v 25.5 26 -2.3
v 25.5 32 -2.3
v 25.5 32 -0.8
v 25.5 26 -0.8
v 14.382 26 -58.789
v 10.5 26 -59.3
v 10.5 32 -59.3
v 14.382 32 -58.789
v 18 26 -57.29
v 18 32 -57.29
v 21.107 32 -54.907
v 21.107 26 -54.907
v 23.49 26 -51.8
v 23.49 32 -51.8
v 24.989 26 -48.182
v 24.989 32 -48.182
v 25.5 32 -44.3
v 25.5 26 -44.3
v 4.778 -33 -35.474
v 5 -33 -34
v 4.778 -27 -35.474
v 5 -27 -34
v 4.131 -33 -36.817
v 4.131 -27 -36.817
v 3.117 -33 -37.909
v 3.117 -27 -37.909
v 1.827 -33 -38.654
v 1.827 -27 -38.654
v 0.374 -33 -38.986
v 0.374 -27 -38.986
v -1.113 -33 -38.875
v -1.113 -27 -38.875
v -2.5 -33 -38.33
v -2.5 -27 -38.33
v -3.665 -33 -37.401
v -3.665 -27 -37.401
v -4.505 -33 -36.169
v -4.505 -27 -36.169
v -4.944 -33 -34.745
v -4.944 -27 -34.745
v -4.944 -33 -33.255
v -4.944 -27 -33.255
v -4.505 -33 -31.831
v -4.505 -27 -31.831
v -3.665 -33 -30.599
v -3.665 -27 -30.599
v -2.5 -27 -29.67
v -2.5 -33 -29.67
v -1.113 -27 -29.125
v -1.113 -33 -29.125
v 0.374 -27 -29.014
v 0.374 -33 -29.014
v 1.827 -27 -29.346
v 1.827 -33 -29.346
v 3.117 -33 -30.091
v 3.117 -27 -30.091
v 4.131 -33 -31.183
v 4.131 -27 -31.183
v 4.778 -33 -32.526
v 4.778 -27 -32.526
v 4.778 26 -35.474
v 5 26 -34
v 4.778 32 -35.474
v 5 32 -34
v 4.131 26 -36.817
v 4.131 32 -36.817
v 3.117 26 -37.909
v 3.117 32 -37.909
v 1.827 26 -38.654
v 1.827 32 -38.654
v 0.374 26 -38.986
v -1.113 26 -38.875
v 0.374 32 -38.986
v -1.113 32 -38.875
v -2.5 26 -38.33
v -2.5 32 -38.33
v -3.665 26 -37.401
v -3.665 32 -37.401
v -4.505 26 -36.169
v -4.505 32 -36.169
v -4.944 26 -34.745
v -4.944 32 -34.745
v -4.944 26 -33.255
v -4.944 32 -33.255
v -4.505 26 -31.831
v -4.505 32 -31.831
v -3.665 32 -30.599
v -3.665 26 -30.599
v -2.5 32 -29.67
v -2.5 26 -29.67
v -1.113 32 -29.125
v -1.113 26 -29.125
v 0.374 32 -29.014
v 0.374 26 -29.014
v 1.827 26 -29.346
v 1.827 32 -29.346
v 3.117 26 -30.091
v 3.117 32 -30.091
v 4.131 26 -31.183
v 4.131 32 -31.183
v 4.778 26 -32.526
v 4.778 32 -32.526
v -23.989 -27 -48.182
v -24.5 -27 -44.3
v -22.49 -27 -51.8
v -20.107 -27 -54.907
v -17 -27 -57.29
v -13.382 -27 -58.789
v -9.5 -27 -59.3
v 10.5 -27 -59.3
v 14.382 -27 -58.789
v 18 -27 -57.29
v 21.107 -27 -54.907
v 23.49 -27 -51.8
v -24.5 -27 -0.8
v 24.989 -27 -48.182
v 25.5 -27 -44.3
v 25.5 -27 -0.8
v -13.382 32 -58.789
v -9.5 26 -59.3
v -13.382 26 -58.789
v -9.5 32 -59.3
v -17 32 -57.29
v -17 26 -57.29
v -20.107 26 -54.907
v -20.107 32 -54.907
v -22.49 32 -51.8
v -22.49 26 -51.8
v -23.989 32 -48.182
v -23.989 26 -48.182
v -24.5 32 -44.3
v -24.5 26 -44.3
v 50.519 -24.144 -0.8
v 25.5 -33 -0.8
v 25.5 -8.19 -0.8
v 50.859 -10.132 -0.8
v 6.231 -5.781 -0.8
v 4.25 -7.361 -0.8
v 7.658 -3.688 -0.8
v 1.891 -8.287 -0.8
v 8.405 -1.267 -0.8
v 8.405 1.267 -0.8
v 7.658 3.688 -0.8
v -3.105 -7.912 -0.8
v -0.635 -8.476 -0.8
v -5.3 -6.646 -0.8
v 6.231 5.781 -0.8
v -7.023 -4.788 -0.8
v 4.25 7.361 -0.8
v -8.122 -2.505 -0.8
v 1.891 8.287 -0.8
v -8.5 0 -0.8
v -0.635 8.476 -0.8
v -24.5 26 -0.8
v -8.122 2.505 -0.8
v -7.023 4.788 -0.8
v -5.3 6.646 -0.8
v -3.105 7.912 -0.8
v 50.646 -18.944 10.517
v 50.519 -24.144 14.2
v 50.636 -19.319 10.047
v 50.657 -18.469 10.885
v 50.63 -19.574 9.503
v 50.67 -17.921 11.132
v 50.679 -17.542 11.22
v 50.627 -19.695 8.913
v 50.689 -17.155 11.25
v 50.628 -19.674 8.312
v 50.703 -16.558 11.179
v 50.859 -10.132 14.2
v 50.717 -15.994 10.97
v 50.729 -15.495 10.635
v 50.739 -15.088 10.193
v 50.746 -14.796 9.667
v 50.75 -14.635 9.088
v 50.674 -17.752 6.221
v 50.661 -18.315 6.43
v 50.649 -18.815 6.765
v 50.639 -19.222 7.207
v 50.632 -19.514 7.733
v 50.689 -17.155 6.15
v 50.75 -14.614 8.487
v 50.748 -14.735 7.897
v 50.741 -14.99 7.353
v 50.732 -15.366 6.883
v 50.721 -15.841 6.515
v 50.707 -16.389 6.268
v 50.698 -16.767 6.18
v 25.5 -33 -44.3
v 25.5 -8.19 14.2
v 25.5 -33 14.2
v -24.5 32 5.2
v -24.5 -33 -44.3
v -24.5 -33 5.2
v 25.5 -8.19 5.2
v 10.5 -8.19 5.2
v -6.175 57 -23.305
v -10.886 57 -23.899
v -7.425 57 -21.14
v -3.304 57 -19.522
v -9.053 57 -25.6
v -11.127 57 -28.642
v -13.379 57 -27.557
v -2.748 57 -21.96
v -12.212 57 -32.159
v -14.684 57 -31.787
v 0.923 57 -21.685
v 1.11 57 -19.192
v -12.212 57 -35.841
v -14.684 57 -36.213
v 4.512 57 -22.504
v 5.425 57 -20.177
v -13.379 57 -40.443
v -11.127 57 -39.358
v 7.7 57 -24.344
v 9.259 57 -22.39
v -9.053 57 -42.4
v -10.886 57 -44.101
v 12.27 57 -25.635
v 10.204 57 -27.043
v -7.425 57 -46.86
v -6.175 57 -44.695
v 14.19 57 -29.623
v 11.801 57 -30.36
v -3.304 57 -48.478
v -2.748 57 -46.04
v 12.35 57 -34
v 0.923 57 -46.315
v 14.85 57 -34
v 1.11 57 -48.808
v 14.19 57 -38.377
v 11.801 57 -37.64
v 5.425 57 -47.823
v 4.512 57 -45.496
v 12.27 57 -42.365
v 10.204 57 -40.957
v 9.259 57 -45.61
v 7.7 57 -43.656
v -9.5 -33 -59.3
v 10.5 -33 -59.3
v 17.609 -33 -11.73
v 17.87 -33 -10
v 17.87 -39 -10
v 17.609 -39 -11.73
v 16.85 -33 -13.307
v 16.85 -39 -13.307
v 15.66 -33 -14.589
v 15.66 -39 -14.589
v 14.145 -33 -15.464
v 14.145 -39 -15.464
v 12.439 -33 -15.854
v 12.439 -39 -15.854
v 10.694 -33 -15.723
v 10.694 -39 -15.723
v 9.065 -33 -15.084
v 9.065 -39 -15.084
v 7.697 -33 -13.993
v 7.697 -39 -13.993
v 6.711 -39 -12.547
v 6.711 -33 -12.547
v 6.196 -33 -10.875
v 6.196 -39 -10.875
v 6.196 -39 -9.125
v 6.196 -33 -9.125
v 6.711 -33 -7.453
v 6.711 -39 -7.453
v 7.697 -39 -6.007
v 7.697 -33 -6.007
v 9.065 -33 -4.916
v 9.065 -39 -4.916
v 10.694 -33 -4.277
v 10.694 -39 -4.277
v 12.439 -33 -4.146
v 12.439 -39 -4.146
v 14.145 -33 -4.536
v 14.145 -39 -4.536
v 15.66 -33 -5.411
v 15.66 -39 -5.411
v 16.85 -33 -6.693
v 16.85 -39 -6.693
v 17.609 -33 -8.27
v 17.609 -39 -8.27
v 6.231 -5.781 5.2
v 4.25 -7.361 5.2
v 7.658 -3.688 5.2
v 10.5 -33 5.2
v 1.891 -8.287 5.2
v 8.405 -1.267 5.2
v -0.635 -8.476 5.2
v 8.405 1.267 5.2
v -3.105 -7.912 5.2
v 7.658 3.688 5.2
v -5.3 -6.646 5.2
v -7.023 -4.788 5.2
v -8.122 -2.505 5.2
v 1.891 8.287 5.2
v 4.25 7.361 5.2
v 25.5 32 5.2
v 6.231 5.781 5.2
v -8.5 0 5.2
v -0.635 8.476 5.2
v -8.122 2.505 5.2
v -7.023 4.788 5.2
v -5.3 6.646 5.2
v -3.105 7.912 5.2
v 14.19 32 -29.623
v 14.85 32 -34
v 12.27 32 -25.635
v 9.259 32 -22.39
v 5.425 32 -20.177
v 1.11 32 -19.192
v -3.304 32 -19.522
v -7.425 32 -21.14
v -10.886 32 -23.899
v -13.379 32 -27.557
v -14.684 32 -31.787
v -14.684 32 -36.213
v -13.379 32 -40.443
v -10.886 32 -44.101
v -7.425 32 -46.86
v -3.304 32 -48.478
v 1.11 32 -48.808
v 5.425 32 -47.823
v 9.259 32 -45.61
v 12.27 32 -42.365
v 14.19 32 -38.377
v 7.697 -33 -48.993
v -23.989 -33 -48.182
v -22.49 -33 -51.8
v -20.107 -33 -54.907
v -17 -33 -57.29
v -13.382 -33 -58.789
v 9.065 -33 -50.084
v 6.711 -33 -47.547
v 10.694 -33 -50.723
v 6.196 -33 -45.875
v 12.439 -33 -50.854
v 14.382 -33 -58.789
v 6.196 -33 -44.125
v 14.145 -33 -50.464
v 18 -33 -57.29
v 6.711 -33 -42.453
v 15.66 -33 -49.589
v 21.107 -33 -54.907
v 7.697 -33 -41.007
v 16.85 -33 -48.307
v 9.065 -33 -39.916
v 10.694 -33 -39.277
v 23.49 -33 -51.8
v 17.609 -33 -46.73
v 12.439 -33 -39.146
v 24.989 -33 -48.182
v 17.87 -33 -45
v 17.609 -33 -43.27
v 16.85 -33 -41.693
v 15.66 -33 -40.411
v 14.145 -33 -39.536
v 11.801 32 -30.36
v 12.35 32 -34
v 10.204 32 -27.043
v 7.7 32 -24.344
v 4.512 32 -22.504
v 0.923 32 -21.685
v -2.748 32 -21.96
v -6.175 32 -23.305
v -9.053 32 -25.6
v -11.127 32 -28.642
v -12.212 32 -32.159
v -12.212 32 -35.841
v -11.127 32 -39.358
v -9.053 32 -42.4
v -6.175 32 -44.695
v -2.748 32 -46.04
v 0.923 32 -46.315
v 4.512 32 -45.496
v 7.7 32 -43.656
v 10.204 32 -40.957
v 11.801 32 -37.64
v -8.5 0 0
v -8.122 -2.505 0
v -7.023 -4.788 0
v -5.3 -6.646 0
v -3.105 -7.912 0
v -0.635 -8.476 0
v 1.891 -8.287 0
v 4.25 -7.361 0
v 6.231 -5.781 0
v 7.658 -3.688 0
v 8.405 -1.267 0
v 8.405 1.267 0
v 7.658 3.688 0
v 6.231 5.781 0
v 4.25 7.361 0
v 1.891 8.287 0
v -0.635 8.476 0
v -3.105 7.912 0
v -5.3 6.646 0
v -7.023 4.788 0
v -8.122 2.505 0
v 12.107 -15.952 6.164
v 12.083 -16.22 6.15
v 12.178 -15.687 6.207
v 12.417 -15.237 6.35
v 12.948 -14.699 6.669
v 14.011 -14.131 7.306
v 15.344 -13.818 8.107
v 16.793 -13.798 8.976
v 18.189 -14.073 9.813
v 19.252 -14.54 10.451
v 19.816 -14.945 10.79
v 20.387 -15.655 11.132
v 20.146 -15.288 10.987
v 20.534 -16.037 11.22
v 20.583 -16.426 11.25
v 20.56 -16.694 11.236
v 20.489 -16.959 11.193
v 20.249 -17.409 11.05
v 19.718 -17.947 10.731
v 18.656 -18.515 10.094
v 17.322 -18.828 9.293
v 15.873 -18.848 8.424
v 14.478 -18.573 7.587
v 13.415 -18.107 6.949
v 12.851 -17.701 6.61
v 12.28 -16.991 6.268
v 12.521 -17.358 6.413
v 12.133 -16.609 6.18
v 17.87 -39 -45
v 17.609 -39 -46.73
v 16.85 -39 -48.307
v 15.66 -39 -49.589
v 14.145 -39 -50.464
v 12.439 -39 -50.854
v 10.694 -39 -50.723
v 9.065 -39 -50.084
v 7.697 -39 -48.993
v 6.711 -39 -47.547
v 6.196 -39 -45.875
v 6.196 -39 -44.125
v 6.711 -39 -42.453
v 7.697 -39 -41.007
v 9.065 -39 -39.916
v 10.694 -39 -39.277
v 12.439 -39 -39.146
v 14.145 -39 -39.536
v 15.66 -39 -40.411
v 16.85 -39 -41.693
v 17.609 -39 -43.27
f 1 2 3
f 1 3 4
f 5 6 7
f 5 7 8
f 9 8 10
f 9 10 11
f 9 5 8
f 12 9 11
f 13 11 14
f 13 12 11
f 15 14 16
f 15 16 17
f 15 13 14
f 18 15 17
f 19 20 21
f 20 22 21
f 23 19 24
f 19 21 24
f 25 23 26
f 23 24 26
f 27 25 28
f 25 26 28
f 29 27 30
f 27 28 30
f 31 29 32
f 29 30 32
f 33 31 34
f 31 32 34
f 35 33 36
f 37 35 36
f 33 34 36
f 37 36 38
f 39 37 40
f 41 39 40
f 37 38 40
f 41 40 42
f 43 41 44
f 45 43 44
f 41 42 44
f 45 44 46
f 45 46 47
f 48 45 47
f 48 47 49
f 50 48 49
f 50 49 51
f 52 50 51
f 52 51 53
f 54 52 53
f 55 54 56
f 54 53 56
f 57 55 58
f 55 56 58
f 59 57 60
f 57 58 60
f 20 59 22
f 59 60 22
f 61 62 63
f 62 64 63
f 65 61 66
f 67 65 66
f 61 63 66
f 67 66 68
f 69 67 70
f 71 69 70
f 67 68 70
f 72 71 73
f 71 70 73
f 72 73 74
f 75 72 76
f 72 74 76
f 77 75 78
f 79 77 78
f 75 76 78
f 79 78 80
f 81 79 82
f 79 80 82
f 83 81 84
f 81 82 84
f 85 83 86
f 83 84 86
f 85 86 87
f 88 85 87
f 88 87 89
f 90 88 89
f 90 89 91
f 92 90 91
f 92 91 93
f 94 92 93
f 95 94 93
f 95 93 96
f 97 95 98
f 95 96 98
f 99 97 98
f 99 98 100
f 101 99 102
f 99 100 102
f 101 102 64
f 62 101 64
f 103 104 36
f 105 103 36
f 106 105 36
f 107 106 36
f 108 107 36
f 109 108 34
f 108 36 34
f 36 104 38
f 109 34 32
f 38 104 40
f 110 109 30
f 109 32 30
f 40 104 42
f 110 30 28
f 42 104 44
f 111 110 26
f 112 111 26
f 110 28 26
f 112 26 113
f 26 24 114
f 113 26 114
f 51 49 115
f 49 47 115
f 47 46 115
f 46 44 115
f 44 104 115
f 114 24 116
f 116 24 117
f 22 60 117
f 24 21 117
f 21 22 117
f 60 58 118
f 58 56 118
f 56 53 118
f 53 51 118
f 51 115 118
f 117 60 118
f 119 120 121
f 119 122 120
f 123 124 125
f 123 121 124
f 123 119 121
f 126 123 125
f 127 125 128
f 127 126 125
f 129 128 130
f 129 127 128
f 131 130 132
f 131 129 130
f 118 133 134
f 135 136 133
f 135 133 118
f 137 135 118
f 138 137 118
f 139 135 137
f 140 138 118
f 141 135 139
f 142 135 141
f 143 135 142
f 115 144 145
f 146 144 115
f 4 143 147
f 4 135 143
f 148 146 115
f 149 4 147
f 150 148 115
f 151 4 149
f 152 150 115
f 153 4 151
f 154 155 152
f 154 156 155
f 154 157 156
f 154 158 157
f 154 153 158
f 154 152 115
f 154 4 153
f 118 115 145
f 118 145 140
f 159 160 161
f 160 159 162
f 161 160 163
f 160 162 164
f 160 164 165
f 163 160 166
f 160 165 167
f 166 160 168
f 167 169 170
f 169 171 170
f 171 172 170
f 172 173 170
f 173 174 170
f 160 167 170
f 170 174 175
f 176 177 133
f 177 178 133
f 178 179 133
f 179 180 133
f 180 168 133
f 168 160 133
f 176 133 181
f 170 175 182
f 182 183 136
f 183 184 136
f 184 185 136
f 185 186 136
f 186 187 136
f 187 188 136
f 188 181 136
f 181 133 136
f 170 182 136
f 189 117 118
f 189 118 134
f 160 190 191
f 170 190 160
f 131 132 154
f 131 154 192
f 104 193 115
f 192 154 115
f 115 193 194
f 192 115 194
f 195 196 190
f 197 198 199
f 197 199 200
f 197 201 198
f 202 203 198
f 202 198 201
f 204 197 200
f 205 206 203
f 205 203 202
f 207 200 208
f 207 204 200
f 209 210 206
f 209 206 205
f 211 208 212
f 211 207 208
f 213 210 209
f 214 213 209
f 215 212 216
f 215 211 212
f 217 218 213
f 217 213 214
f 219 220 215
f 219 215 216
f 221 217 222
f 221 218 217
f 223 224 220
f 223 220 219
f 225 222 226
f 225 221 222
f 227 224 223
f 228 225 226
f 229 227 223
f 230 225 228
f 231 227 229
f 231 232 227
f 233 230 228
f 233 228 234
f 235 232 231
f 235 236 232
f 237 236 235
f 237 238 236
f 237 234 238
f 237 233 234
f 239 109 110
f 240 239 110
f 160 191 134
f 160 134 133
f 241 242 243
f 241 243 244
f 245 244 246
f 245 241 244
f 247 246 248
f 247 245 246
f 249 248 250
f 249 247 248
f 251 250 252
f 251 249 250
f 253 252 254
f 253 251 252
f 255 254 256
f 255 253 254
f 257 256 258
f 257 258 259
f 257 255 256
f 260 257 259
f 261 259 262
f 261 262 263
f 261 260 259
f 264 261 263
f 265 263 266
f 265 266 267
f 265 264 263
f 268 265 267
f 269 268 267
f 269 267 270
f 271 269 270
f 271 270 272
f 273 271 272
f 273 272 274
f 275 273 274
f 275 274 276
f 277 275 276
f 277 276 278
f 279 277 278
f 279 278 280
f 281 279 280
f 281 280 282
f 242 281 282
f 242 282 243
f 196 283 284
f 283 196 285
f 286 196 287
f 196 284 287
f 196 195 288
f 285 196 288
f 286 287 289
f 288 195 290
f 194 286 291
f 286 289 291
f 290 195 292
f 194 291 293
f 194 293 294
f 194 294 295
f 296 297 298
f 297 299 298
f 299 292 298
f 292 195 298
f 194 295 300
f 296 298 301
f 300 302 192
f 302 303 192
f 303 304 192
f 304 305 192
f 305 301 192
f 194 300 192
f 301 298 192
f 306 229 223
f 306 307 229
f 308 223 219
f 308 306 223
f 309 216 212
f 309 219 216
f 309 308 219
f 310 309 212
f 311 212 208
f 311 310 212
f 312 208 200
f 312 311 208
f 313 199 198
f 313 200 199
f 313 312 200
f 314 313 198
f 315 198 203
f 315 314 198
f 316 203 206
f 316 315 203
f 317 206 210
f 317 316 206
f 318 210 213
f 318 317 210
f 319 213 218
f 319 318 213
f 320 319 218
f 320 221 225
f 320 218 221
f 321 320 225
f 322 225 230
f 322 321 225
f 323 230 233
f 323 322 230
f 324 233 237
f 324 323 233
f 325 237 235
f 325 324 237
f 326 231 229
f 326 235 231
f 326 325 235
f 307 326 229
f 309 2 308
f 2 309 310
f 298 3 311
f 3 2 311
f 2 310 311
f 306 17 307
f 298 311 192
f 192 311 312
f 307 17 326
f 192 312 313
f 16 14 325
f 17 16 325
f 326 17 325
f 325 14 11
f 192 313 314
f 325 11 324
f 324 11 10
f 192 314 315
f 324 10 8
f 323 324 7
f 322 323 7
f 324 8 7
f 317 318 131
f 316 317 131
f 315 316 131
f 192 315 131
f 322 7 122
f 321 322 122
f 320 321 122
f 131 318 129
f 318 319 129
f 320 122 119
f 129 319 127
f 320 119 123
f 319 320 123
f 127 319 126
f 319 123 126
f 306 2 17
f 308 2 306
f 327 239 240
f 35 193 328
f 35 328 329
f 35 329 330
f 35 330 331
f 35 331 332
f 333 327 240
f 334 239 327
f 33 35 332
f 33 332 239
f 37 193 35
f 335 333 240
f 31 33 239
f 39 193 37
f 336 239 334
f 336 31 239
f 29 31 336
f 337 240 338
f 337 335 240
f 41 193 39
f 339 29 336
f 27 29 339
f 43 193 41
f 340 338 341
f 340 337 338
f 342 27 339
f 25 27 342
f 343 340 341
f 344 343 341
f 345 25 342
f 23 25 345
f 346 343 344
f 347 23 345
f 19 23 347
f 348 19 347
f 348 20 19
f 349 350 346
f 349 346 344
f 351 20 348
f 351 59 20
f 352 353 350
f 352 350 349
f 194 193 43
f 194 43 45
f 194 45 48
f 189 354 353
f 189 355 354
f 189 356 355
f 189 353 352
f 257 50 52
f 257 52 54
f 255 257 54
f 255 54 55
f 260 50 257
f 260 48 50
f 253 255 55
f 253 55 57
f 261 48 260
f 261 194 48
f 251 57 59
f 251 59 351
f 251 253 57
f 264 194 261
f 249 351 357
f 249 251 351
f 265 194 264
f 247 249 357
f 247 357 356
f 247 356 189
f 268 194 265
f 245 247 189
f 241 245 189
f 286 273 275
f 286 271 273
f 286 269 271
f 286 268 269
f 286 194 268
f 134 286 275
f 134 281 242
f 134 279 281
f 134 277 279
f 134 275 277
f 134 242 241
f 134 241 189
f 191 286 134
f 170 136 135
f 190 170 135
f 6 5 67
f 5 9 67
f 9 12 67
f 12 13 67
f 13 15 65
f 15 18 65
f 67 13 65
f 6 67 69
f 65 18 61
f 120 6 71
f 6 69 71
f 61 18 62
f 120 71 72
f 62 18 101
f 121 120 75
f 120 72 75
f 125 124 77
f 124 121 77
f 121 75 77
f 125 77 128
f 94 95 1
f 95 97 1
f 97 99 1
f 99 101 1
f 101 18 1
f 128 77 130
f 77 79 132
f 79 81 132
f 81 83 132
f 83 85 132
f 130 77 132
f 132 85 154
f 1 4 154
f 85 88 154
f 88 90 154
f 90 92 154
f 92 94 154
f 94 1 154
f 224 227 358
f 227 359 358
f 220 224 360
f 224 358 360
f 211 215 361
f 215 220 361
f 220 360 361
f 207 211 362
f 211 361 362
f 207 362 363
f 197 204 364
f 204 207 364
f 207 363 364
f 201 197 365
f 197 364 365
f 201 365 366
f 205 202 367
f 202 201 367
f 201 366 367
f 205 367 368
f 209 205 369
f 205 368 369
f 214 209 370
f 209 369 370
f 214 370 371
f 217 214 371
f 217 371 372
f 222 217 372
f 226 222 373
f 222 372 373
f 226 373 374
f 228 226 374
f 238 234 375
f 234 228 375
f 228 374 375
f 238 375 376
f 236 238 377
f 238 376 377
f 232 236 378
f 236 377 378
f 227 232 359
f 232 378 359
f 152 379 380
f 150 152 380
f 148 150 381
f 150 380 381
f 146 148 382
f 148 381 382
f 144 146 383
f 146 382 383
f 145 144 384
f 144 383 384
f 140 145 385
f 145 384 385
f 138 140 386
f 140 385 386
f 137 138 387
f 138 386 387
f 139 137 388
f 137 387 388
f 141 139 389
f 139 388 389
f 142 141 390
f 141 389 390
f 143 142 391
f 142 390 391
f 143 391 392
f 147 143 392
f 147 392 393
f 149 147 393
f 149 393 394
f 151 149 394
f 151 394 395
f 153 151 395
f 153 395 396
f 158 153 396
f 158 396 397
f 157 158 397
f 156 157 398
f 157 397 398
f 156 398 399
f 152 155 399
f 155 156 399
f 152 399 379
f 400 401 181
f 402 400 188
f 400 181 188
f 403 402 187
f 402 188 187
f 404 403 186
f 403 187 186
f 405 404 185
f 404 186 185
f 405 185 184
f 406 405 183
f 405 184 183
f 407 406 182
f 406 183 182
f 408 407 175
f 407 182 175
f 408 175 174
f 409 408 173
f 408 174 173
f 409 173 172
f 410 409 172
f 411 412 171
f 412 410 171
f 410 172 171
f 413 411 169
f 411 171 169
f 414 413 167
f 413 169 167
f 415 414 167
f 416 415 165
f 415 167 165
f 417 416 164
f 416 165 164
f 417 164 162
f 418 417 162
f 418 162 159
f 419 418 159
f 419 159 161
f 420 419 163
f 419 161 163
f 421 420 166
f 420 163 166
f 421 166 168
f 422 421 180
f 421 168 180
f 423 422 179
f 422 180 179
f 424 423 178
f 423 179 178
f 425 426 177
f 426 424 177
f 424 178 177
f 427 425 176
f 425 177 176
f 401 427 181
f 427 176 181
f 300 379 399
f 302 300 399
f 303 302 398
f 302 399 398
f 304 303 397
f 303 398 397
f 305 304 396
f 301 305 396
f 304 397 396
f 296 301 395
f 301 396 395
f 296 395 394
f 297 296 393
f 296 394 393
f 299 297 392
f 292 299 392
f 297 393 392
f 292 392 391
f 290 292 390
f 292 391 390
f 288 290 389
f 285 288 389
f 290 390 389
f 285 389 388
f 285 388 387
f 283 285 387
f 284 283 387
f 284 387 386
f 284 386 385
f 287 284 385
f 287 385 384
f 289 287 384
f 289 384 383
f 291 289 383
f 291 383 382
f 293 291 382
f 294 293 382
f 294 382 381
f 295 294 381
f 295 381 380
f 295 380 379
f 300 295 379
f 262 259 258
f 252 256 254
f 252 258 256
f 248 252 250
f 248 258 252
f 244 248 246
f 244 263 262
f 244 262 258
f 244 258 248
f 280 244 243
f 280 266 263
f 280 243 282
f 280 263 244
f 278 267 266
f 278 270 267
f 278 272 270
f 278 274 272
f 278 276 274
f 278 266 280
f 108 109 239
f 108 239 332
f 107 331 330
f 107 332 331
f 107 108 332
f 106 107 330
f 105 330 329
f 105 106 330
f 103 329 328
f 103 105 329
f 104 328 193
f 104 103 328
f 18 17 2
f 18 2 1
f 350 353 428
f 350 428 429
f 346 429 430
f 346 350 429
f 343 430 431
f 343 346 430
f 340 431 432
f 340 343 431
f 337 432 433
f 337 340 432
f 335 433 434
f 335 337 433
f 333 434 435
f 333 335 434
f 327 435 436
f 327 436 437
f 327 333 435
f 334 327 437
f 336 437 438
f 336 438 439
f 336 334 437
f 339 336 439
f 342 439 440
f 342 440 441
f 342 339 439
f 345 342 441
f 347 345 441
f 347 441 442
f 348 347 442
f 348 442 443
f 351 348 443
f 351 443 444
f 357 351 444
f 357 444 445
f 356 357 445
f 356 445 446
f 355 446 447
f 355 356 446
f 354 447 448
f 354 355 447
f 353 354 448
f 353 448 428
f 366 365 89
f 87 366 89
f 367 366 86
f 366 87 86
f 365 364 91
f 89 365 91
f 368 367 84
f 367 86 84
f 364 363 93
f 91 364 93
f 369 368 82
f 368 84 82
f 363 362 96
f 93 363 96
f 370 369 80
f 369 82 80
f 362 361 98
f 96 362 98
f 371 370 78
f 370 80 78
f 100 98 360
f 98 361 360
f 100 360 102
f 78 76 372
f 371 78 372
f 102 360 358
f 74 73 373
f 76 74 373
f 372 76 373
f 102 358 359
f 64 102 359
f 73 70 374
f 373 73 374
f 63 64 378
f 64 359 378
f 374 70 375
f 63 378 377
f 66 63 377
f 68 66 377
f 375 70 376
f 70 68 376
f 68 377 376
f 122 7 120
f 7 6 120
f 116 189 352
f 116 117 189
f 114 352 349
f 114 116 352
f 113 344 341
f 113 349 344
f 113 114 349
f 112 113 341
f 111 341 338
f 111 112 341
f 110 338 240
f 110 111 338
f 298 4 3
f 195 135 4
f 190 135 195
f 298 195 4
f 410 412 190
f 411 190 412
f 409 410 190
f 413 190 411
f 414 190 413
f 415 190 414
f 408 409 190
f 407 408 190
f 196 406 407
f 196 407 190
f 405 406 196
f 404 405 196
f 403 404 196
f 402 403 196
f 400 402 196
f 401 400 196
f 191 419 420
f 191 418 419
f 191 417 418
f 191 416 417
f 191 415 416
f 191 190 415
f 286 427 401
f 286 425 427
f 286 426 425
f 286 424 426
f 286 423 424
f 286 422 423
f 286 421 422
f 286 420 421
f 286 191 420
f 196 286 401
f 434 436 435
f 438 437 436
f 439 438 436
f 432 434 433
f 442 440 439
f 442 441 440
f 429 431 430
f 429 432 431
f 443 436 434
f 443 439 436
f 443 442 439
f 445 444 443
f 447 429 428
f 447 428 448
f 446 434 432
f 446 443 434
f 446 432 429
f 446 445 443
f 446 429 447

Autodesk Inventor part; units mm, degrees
sketch "Sketch1" plane through (0, 0, 0) normal (0, 0, 1) x (1, 0, 0)
  line L0 (25.5, -27) -> (-25.5, -27)
  line L1 (-25.5, -27) -> (-25.5, 27)
  line L2 (-25.5, 27) -> (25.5, 27)
  line L3 (25.5, 27) -> (25.5, -27)
  line L4 (25.5, -27) -> (-25.5, 27) construction
  line L5 (-25.5, -27) -> (25.5, 27) construction
  point P0 (0, 0)
  dimension "d0" = 51
  dimension "d1" = 54
extrude "Extrusion1" add sketch "Sketch1" along normal blind 6
sketch "Sketch2" plane through (0, 0, 6) normal (0, 0, 1) x (1, 0, 0)
  circle A0 centre (0, 0) radius 15
  dimension "d4" = 30
sketch "Sketch4" plane through (0, 0, 6) normal (0, 0, 1) x (1, 0, 0)
  line L0 (-25.5, 27) -> (26.5, 27)
  line L1 (-25.5, -27) -> (25.5, -27) projected
  line L2 (25.5, -27) -> (-25.5, -27)
  line L3 (-25.5, -27) -> (-25.5, -33)
  line L4 (-25.5, -33) -> (25.5, -33)
  line L5 (25.5, -33) -> (25.5, -27)
  point P0 (0, 0)
  dimension "d109" = 51
  dimension "d110" = 6
extrude "Extrusion4" add sketch "Sketch4" against normal blind 65.3
ref_plane "Plano de trabajo8" through (25.5, -33.8, -42) normal (1, 0, 0) x (0, 0, -1)
ref_plane "Work Plane9" through (-10.5, -27, -57) normal (0, 1, 0) x (1, 0, 0)
sketch "Sketch25" plane through (-10.5, -27, -57) normal (0, 1, 0) x (1, 0, 0)
  line L0 (0, 0) -> (21, 0) projected
  line L1 (10.5, 0) -> (10.5, -23)
  circle A0 centre (10.5, -23) radius 5
  line L2 (10.5, -23) -> (10.5, -63)
  line L3 (36, -63) -> (-15, -63) projected
  point P0 (10.5, -57)
  dimension "d111" = 23
  dimension "d112" = 10
extrude "Extrusion22" cut sketch "Sketch25" against normal blind 68
ref_plane "Work Plane7" through (-10.5, -0.5, -57) normal (0, 1, 0) x (1, 0, 0)
mirror "Mirror2" about plane through (-10.5, -0.5, -57) normal (0, 1, 0) of "Extrusion4"
extrude "Extrusión28" cut sketch "Sketch2" against normal blind 10
ref_plane "Work Plane10" through (25.5, -34, -42) normal (1, 0, 0) x (0, 0, -1)
ref_plane "Work Plane11" through (-25.5, -87, 1.3) normal (0, 1, 0) x (1, 0, 0)
sketch "Sketch37" plane through (-25.5, 32, 6) normal (0, 1, 0) x (1, 0, 0)
  circle A0 centre (25.5, 40) radius 5 projected
  point P0 (25.5, 6)
extrude "Extrusion33" cut sketch "Sketch37" against normal blind 68
sketch "Sketch43" plane through (0, 0, 6) normal (0, 0, 1) x (1, 0, 0)
  circle A0 centre (0, 0) radius 10.4895
  circle A1 centre (0, 0) radius 15 projected
  circle A2 centre (0, 0) radius 5
  dimension "d182" = 10
extrude "Extrusion40" add sketch "Sketch43" against normal blind 8.3 contours A0 | A1
sketch "Boceto48" plane through (-25.5, -33, 6) normal (0, -1, 0) x (1, 0, 0)
  point P0 (25.5, -6)
sketch "Boceto49" plane through (-25.5, -33, 6) normal (0, -1, 0) x (1, 0, 0)
  point P0 (25.5, -6)
sketch "Boceto50" plane through (25.5, 26, -59.3) normal (0, 0, -1) x (-1, 0, 0)
  point P0 (25.5, -26)
sketch "Boceto77" plane through (0, 0, 6) normal (0, 0, 1) x (1, 0, 0)
  point P0 (0, 0)
sketch "Boceto84" plane through (25.5, -33, -59.3) normal (1, 0, 0) x (0, 0, -1)
  line L0 (-65.3, 0) -> (-65.3, 65) projected
  line L1 (-65.3, 0) -> (-65.3, 32.3804)
  line L2 (-65.3, 32.3804) -> (-80.5662, 32.3804)
  line L3 (-80.5662, 32.3804) -> (-80.5662, -6.9517)
  line L4 (-80.5662, -6.9517) -> (-65.3, -6.9517)
  line L5 (-65.3, -6.9517) -> (-65.3, 0)
  point P0 (-59.3, 33)
  point P1 (-65.3, 66.9563)
  point P2 (-65.3, 65.9563)
extrude "Extrusión80" cut sketch "Boceto84" along normal mid plane 100
sketch "Boceto85" plane through (0, 0, 0) normal (0, 0, -1) x (-1, 0, 0)
  line L0 (-25.5, -33) -> (-25.5, -4.0448)
  line L1 (-25.5, -27) -> (-25.5, 26) projected
  line L2 (-25.5, -4.0448) -> (-53.9802, -4.6672)
  line L3 (-53.9802, -4.6672) -> (-54.6281, -33.6366)
  line L4 (-54.6281, -33.6366) -> (-25.5, -33)
  point P0 (0, 0)
  point P1 (-25.5, -13.7947)
extrude "Extrusión81" cut sketch "Boceto85" along normal mid plane 100
sketch "Boceto90" plane through (0, 0, 6) normal (0, 0, 1) x (1, 0, 0)
  circle A0 centre (0, 0) radius 5.2249
  circle A1 centre (0, 0) radius 14.4421
extrude "Extrusión86" add sketch "Boceto90" along normal blind 4.7
fillet "Empalme20" radius 2 1 edges at (-14.4421, 0, 6)
sketch "Boceto91" plane through (0, 0, 0) normal (0, 0, -1) x (-1, 0, 0)
  point P0 (0, 0)
sketch "Boceto92" plane through (0, 0, 0) normal (0, 0, -1) x (-1, 0, 0)
  point P0 (0, 0)
sketch "Boceto93" plane through (0, 0, 0) normal (0, 0, -1) x (-1, 0, 0)
  line L0 (-25.5, -27) -> (-25.5, 26) projected
  line L1 (-25.5, 1.3668) -> (-41.5813, 1.3668)
  line L2 (-41.5813, 1.3668) -> (-41.5813, -33)
  line L3 (-25.5, -33) -> (-41.5813, -33)
  line L4 (-25.5, -33) -> (-25.5, 32.9563) projected
  line L5 (-25.5, 1.3668) -> (-25.5, -33)
  point P0 (0, 0)
extrude "Extrusión87" add sketch "Boceto93" against normal blind 8.3
sketch "Boceto94" plane through (0, 0, 6) normal (0, 0, 1) x (1, 0, 0)
  line L0 (41.5813, -33) -> (41.5813, 1.3668) projected
  line L1 (41.5813, 1.3668) -> (41.5813, 35.5236)
  line L2 (-25.5, 32.9563) -> (25.5, 32.9563) projected
  line L3 (25.5, 32.9563) -> (41.5813, 32.9563)
  line L4 (25.5, 32.9563) -> (25.5, 1.3668)
  line L5 (25.5, 1.3668) -> (41.5813, 1.3668)
  point P0 (0, 0)
extrude "Extrusión88" add sketch "Boceto94" against normal blind 8.3
sketch "Boceto95" plane through (0, 0, 6) normal (0, 0, 1) x (1, 0, 0)
  circle A0 centre (37.8913, -24.81) radius 2.6
  line L0 (35.2913, -24.81) -> (37.8913, -24.81)
  point P0 (0, 0)
  point P1 (41.5813, -33)
  dimension "d305" = 5.2
extrude "Extrusión89" cut sketch "Boceto95" against normal blind 8.3
sketch "Boceto97" plane through (-25.5, -33, -59.3) normal (-1, 0, 0) x (0, 0, 1)
  line L0 (59.3, 0) -> (67.6, 0) projected
  line L1 (67.6, 0) -> (89.1392, 0)
  line L2 (89.1392, 0) -> (89.1392, 69.8717)
  line L3 (89.1392, 69.8717) -> (67.6, 69.8717)
  line L4 (67.6, 69.8717) -> (67.6, 0)
  point P0 (59.3, 33)
extrude "Extrusión92" cut sketch "Boceto97" against normal blind 1000
sketch "Boceto98" plane through (-25.5, -33, -59.3) normal (-1, 0, 0) x (0, 0, 1)
  line L0 (59.3, 59) -> (59.3, 6) projected
  line L1 (59.3, 59) -> (58.3, 59) projected
  line L2 (59.3, 6) -> (59.3, 59)
  line L3 (59.3, 59) -> (56.1979, 59)
  line L4 (59.3, 59) -> (0, 59) projected
  line L5 (56.1979, 59) -> (56.1979, 6)
  line L6 (59.3, 6) -> (0, 6) projected
  line L7 (56.1979, 6) -> (59.3, 6)
  line L8 (65.3, 65) -> (0, 65) projected
  line L9 (56.1979, 65) -> (56.1979, 67.4992)
  line L10 (56.1979, 67.4992) -> (67.7631, 67.4992)
  line L11 (67.7631, 67.4992) -> (76.364, 67.4992)
  line L12 (76.364, 67.4992) -> (76.364, -7.6447)
  line L13 (65.3, 0) -> (65.3, 34.3668) projected
  line L14 (65.3, 0) -> (65.3, -7.6447)
  line L15 (65.3, -7.6447) -> (76.364, -7.6447)
  line L16 (65.3, 0) -> (65.3, 65)
  line L17 (65.3, 0) -> (65.3, 65) projected
  line L18 (56.1979, 65) -> (65.3, 65)
  point P0 (59.3, 33)
  point P1 (59.3, 51.8098)
  point P2 (58.3, 65)
  point P3 (65.3, 65.9563)
  point P4 (59.3, 51.8098)
  point P5 (58.3, 65)
  point P6 (65.3, 34.3668)
extrude "Extrusión93" cut sketch "Boceto98" along normal mid plane 1000
sketch "Boceto99" plane through (41.5813, -33, 0) normal (1, 0, 0) x (0, 0, -1)
  line L0 (0, 58.9816) -> (2.3, 58.9816)
  line L1 (2.3, 65) -> (2.3, 59) projected
  line L2 (2.3, 58.9816) -> (2.3, 65)
  line L3 (2.3, 65) -> (2.3, 58.9816)
  line L4 (2.3, 65) -> (0, 65)
  line L5 (-6, 65) -> (59.3, 65) projected
  line L6 (0, 58.9816) -> (0, 65)
  point P0 (0, 33)
extrude "Extrusión94" cut sketch "Boceto99" against normal blind 16.081
sketch "Boceto100" plane through (25.5, 26, -59.3) normal (0, 0, -1) x (-1, 0, 0)
  line L0 (-16.0813, 6) -> (-0.0003, 6) projected
  line L1 (0, 0) -> (-16.0813, 0)
  line L2 (-16.0813, 0) -> (-16.0813, 6)
  line L3 (-16.0813, 6) -> (0, 6)
  line L4 (0, 6) -> (0, 0)
  point P0 (25.5, -26)
  point P1 (-0.0003, 6)
extrude "Extrusión95" cut sketch "Boceto100" against normal blind 59.3
sketch "Boceto101" plane through (0, 0, 0) normal (0, 0, -1) x (-1, 0, 0)
  circle A0 centre (0, 0) radius 8.5
  dimension "d322" = 17
extrude "Extrusión96" cut sketch "Boceto101" against normal blind 59.3
sketch "Boceto102" plane through (-25.5, 32, -59.3) normal (0, 1, 0) x (1, 0, 0)
  circle A0 centre (25.5, -25.3) radius 5 projected
  circle A1 centre (25.5, -25.3) radius 12.35
  circle A2 centre (25.5, -25.3) radius 14.85
  point P0 (25.5, -59.3)
  dimension "d325" = 24.7
  dimension "d326" = 29.7
extrude "Extrusión97" add sketch "Boceto102" along normal blind 25 contours A2
sketch "Boceto103" plane through (-25.5, -27, -59.3) normal (0, 1, 0) x (1, 0, 0)
  point P0 (25.5, -59.3)
sketch "Boceto104" plane through (0, 0, 6) normal (0, 0, 1) x (1, 0, 0)
  line L0 (-25.5, -33) -> (-25.5, 32) projected
  line L1 (41.5813, 32) -> (41.5813, -33) projected
  line L2 (-25.5, 32) -> (41.5813, 32)
  line L3 (41.5813, 32) -> (41.5813, -33)
  line L4 (41.5813, -33) -> (-25.5, -33)
  line L5 (-25.5, -33) -> (-25.5, 32)
  point P0 (0, 0)
extrude "Extrusión98" cut sketch "Boceto104" against normal blind 0.8
sketch "Boceto105" plane through (0, 0, 0) normal (0, 0, -1) x (-1, 0, 0)
  line L0 (-25.5, -33) -> (25.5, -33) projected
  line L1 (-41.5813, 32) -> (25.5, 32)
  line L2 (25.5, 32) -> (25.5, -33)
  line L3 (25.5, -33) -> (-41.5813, -33)
  line L4 (-41.5813, -33) -> (-41.5813, 32)
  circle A0 centre (-37.8913, -24.81) radius 2.6 projected
  circle A1 centre (-37.8913, -24.81) radius 2.6
  circle A2 centre (0, 0) radius 8.5
extrude "Extrusión99" add sketch "Boceto105" along normal blind 0.8
sketch "Boceto106" plane through (-25.5, -33, -59.3) normal (0, -1, 0) x (1, 0, 0)
  line L0 (0, 0) -> (51, 0) projected
  line L1 (67.0813, 64.5) -> (0, 64.5) projected
  line L2 (0, 0) -> (1, 0)
  line L3 (1, 0) -> (1, 64.5)
  line L4 (1, 64.5) -> (0, 64.5)
  line L5 (0, 64.5) -> (0, 0)
  point P0 (25.5, 59.3)
  point P1 (0, 64.5)
  point P2 (1, 0)
  dimension "d333" = 1
extrude "Extrusión100" cut sketch "Boceto106" against normal blind 1000
sketch "Boceto107" plane through (0, 0, -0.8) normal (0, 0, -1) x (-1, 0, 0)
  line L0 (-25.5, -33) -> (-25.5, -38.9196)
  line L1 (-25.5, -38.9196) -> (-33.0828, -52.767)
  line L2 (-33.0828, -52.767) -> (-34.3078, -45.7968) construction
  line L3 (-41.5813, -33) -> (24.5, -33) projected
  spline S0 degree 3 poles (-33.0828, -52.767) (-34.3078, -45.7968) (-36.0426, -41.6296) (-38.17, -38.0712) knots 1 1 1 1 1.670244 1.670244 1.670244 1.670244
  line L4 (-41.5813, 32) -> (-41.5813, -33) projected
  line L5 (-37.8729, -38.2076) -> (-46.4829, -34.2556)
  line L6 (-46.4829, -34.2556) -> (-46.4829, 32)
  line L7 (-46.4829, 32) -> (-41.5813, 32)
  line L8 (-34.3078, -45.7968) -> (-36.0426, -41.6296) construction
  line L9 (-36.0426, -41.6296) -> (-38.17, -38.0712) construction
  point P0 (0, 0)
extrude "Extrusión101" add sketch "Boceto107" against normal blind 6
fillet "Empalme21" radius 2 2 edges at (38.17, -38.0712, 2.2) (46.4829, -34.2556, 2.2)
sketch "Boceto108" plane through (-24.5, -33, 5.2) normal (0, -1, 0) x (1, 0, 0)
  circle A0 centre (24.5, -39.2) radius 5 projected
  line L0 (50, -6) -> (0, -6) projected
  circle A1 centre (36.5, -15.2) radius 5.87
  circle A2 centre (36.5, -50.2) radius 5.87
  line L1 (36.5, -15.2) -> (36.5, -50.2)
  point P0 (24.5, -5.2)
  dimension "d344" = 11.74
  dimension "d345" = 11.74
  dimension "d392" = 35
extrude "Extrusión102" add sketch "Boceto108" along normal blind 6 contours A1 | A2
sketch "Boceto109" plane through (0, 0, -0.8) normal (0, 0, -1) x (-1, 0, 0)
  line L0 (-45.3172, -34.7906) -> (-38.7421, -37.8086) projected
  line L1 (-45.3172, -34.7906) -> (-49.6596, -32.7974)
  line L2 (-49.6596, -32.7974) -> (-49.6596, 32)
  line L3 (-46.4829, 32) -> (-46.4829, -32.9729) projected
  line L4 (-49.6596, 32) -> (-46.4829, 32)
  arc A0 (-46.4829, -32.9729) -> (-45.3172, -34.7906) centre (-44.4829, -32.9729) ccw projected
  line L5 (-46.4829, 32) -> (-45.3172, -34.7906)
  point P0 (0, 0)
extrude "Extrusión103" add sketch "Boceto109" against normal blind 6 contours L1 L2 L4 L3 A0
fillet "Empalme23" radius 4 2 edges at (49.6596, -32.7974, 2.2) (49.6596, 32, 2.2)
sketch "Boceto110" plane through (0, 0, 5.2) normal (0, 0, 1) x (1, 0, 0)
  line L0 (33.0828, -52.767) -> (25.5, -38.9196) projected
  line L1 (25.5, -38.9196) -> (37.9157, -38.9196)
  line L2 (37.9157, -38.9196) -> (33.0828, -52.767)
  line L3 (33.0828, -52.767) -> (25.5, -38.9196)
  point P0 (0, 0)
extrude "Extrusión104" cut sketch "Boceto110" against normal blind 10
sketch "Sketch111" plane through (0, 0, 5.2) normal (0, 0, 1) x (1, 0, 0)
  line L0 (25.5, -33) -> (25.5, -38.9196) projected
  line L1 (38.7421, -37.8086) -> (47.3283, -33.8675) projected
  line L2 (25.5, -33) -> (47.3283, -33.8675)
  line L3 (37.6774, -38.9196) -> (25.5, -38.9196) projected
  line L4 (25.5, -38.9196) -> (37.6774, -38.9196)
  line L5 (37.6774, -38.9196) -> (38.7421, -37.8086)
  point P0 (0, 0)
extrude "Extrusion105" cut sketch "Sketch111" against normal blind 10
sketch "Sketch114" plane through (0, 0, -0.8) normal (0, 0, -1) x (-1, 0, 0)
  line L0 (-25.5, 32) -> (-25.5, 26) projected
  line L1 (-25.5, 26) -> (-25.5, 32)
  line L2 (-25.5, 32) -> (-25.5, -13.2226)
  line L3 (-25.5, -13.2226) -> (-49.6596, -13.2226)
  line L4 (-49.6596, -30.2322) -> (-49.6596, 28) projected
  line L5 (-49.6596, 28) -> (-49.6596, -30.2322) projected
  line L6 (-49.6596, -13.2226) -> (-49.6596, 28)
  line L7 (-25.5, 32) -> (-45.6596, 32) projected
  arc A0 (-45.6596, 32) -> (-49.6596, 28) centre (-45.6596, 28) ccw projected
  arc A1 (-45.6596, 32) -> (-49.6596, 28) centre (-45.6596, 28) ccw
  line L8 (-45.6596, 32) -> (-25.5, 32)
  point P0 (0, 0)
extrude "Extrusion108" cut sketch "Sketch114" against normal blind 6
sketch "Sketch115" plane through (0, 0, -59.3) normal (0, 0, -1) x (-1, 0, 0)
  line L0 (-50.9952, -38.1245) -> (29.0048, -38.1245)
  line L1 (29.0048, -38.1245) -> (29.0048, 81.8755)
  line L2 (29.0048, 81.8755) -> (-50.9952, 81.8755)
  line L3 (-50.9952, 81.8755) -> (-50.9952, -38.1245)
  point P0 (0, 0)
  dimension "d363" = 80
  dimension "d364" = 120
sketch "Sketch116" plane through (0, 0, 5.2) normal (0, 0, 1) x (1, 0, 0)
  line L0 (25.5, -33) -> (-24.5, -33) projected
  line L1 (25.5, -33) -> (50.5194, -24.1438)
  line L2 (50.5194, -24.1438) -> (50.8592, -10.1321)
  line L3 (50.8592, -10.1321) -> (25.5, -8.1902)
  line L4 (25.5, 26) -> (25.5, -13.2226) projected
  line L5 (25.5, -27) -> (25.5, -33) projected
  line L6 (25.5, -33) -> (25.5, -8.1902)
  line L7 (25.5, -33) -> (62.3665, -33)
  line L8 (62.3665, -33) -> (62.3665, 19.7655)
  line L9 (62.3665, 19.7655) -> (25.5, 19.7655)
  line L10 (25.5, 19.7655) -> (25.5, -33)
  line L11 (62.3665, 19.7655) -> (25.5, 19.7655)
  line L12 (25.5, 19.7655) -> (25.5, -84.5573)
  line L13 (25.5, -84.5573) -> (62.3665, -84.5573)
  line L14 (62.3665, -84.5573) -> (62.3665, 19.7655)
  point P0 (0, 0)
extrude "Extrusion109" add sketch "Sketch116" along normal blind 9 and the other way blind 6 contours L5 L6 L4 L3 L2 L1
sketch "Sketch117" plane through (50.8592, -10.1321, 14.2) normal (0.9997, -0.0242, 0) x (0, 0, -1)
  line L0 (1.2948, -7.0247) -> (1.2483, -7.0247)
  line L1 (0, 1.3265) -> (0, -23.476) projected
  line L2 (9, -23.476) -> (9, 1.3265) projected
  circle A0 centre (5.5, -7.0247) radius 2.55
  line L3 (0, -7.0247) -> (5.5, -7.0247)
  point P0 (14.2, 8.896)
  dimension "d387" = 5.5
  dimension "d388" = 5.1
extrude "Extrusion111" cut sketch "Sketch116" against normal blind 20 contours L1 L2 L3 L4 L9 L8 L7 | L7 L14 L13 L12
sketch "Sketch118" plane through (-24.5, -33, -59.3) normal (0, -1, 0) x (1, 0, 0)
  line L0 (75.3592, 73.5) -> (50, 73.5) projected
  line L1 (50, 64.5) -> (50, 73.5) projected
  line L2 (50, 73.5) -> (50, 64.5)
  line L3 (50, 64.5) -> (35, 64.5)
  line L4 (50, 73.5) -> (35, 64.5)
  line L5 (50, 73.5) -> (35, 73.5)
  line L6 (35, 73.5) -> (35, 64.5)
  point P0 (24.5, 59.3)
  dimension "d373" = 15
extrude "Extrusion112" add sketch "Sketch118" against normal blind 24.81 contours L3 L4 L1
sketch "Sketch119" plane through (0, 0, 5.2) normal (0, 0, 1) x (1, 0, 0)
  circle A0 centre (0, 0) radius 12.5
  dimension "d376" = 25
extrude "Extrusion113" cut sketch "Sketch119" along normal blind 24.81
extrude "Extrusion115" cut sketch "Sketch117" against normal blind 40
fillet "Fillet25" radius 15 4 edges at (-24.5, -30, -59.3) (25.5, -30, -59.3) (25.5, 29, -59.3) (-24.5, 29, -59.3)
sketch "Sketch124" plane through (0, 0, 5.2) normal (0, 0, 1) x (1, 0, 0)
  point P0 (0, 0)
sketch "Sketch125" plane through (0, 0, 5.2) normal (0, 0, 1) x (1, 0, 0)
  point P0 (0, 0)
sketch "Sketch126" plane through (12, -39, -10) normal (0, -1, 0) x (1, 0, 0)
  point P0 (-12, 10)
ref_plane "Work Plane3" through (-10.35, 26, -57) normal (0, 1, 0) x (1, 0, 0)
properties part number "C23[L][FD1]" material "Aluminum 6061"
